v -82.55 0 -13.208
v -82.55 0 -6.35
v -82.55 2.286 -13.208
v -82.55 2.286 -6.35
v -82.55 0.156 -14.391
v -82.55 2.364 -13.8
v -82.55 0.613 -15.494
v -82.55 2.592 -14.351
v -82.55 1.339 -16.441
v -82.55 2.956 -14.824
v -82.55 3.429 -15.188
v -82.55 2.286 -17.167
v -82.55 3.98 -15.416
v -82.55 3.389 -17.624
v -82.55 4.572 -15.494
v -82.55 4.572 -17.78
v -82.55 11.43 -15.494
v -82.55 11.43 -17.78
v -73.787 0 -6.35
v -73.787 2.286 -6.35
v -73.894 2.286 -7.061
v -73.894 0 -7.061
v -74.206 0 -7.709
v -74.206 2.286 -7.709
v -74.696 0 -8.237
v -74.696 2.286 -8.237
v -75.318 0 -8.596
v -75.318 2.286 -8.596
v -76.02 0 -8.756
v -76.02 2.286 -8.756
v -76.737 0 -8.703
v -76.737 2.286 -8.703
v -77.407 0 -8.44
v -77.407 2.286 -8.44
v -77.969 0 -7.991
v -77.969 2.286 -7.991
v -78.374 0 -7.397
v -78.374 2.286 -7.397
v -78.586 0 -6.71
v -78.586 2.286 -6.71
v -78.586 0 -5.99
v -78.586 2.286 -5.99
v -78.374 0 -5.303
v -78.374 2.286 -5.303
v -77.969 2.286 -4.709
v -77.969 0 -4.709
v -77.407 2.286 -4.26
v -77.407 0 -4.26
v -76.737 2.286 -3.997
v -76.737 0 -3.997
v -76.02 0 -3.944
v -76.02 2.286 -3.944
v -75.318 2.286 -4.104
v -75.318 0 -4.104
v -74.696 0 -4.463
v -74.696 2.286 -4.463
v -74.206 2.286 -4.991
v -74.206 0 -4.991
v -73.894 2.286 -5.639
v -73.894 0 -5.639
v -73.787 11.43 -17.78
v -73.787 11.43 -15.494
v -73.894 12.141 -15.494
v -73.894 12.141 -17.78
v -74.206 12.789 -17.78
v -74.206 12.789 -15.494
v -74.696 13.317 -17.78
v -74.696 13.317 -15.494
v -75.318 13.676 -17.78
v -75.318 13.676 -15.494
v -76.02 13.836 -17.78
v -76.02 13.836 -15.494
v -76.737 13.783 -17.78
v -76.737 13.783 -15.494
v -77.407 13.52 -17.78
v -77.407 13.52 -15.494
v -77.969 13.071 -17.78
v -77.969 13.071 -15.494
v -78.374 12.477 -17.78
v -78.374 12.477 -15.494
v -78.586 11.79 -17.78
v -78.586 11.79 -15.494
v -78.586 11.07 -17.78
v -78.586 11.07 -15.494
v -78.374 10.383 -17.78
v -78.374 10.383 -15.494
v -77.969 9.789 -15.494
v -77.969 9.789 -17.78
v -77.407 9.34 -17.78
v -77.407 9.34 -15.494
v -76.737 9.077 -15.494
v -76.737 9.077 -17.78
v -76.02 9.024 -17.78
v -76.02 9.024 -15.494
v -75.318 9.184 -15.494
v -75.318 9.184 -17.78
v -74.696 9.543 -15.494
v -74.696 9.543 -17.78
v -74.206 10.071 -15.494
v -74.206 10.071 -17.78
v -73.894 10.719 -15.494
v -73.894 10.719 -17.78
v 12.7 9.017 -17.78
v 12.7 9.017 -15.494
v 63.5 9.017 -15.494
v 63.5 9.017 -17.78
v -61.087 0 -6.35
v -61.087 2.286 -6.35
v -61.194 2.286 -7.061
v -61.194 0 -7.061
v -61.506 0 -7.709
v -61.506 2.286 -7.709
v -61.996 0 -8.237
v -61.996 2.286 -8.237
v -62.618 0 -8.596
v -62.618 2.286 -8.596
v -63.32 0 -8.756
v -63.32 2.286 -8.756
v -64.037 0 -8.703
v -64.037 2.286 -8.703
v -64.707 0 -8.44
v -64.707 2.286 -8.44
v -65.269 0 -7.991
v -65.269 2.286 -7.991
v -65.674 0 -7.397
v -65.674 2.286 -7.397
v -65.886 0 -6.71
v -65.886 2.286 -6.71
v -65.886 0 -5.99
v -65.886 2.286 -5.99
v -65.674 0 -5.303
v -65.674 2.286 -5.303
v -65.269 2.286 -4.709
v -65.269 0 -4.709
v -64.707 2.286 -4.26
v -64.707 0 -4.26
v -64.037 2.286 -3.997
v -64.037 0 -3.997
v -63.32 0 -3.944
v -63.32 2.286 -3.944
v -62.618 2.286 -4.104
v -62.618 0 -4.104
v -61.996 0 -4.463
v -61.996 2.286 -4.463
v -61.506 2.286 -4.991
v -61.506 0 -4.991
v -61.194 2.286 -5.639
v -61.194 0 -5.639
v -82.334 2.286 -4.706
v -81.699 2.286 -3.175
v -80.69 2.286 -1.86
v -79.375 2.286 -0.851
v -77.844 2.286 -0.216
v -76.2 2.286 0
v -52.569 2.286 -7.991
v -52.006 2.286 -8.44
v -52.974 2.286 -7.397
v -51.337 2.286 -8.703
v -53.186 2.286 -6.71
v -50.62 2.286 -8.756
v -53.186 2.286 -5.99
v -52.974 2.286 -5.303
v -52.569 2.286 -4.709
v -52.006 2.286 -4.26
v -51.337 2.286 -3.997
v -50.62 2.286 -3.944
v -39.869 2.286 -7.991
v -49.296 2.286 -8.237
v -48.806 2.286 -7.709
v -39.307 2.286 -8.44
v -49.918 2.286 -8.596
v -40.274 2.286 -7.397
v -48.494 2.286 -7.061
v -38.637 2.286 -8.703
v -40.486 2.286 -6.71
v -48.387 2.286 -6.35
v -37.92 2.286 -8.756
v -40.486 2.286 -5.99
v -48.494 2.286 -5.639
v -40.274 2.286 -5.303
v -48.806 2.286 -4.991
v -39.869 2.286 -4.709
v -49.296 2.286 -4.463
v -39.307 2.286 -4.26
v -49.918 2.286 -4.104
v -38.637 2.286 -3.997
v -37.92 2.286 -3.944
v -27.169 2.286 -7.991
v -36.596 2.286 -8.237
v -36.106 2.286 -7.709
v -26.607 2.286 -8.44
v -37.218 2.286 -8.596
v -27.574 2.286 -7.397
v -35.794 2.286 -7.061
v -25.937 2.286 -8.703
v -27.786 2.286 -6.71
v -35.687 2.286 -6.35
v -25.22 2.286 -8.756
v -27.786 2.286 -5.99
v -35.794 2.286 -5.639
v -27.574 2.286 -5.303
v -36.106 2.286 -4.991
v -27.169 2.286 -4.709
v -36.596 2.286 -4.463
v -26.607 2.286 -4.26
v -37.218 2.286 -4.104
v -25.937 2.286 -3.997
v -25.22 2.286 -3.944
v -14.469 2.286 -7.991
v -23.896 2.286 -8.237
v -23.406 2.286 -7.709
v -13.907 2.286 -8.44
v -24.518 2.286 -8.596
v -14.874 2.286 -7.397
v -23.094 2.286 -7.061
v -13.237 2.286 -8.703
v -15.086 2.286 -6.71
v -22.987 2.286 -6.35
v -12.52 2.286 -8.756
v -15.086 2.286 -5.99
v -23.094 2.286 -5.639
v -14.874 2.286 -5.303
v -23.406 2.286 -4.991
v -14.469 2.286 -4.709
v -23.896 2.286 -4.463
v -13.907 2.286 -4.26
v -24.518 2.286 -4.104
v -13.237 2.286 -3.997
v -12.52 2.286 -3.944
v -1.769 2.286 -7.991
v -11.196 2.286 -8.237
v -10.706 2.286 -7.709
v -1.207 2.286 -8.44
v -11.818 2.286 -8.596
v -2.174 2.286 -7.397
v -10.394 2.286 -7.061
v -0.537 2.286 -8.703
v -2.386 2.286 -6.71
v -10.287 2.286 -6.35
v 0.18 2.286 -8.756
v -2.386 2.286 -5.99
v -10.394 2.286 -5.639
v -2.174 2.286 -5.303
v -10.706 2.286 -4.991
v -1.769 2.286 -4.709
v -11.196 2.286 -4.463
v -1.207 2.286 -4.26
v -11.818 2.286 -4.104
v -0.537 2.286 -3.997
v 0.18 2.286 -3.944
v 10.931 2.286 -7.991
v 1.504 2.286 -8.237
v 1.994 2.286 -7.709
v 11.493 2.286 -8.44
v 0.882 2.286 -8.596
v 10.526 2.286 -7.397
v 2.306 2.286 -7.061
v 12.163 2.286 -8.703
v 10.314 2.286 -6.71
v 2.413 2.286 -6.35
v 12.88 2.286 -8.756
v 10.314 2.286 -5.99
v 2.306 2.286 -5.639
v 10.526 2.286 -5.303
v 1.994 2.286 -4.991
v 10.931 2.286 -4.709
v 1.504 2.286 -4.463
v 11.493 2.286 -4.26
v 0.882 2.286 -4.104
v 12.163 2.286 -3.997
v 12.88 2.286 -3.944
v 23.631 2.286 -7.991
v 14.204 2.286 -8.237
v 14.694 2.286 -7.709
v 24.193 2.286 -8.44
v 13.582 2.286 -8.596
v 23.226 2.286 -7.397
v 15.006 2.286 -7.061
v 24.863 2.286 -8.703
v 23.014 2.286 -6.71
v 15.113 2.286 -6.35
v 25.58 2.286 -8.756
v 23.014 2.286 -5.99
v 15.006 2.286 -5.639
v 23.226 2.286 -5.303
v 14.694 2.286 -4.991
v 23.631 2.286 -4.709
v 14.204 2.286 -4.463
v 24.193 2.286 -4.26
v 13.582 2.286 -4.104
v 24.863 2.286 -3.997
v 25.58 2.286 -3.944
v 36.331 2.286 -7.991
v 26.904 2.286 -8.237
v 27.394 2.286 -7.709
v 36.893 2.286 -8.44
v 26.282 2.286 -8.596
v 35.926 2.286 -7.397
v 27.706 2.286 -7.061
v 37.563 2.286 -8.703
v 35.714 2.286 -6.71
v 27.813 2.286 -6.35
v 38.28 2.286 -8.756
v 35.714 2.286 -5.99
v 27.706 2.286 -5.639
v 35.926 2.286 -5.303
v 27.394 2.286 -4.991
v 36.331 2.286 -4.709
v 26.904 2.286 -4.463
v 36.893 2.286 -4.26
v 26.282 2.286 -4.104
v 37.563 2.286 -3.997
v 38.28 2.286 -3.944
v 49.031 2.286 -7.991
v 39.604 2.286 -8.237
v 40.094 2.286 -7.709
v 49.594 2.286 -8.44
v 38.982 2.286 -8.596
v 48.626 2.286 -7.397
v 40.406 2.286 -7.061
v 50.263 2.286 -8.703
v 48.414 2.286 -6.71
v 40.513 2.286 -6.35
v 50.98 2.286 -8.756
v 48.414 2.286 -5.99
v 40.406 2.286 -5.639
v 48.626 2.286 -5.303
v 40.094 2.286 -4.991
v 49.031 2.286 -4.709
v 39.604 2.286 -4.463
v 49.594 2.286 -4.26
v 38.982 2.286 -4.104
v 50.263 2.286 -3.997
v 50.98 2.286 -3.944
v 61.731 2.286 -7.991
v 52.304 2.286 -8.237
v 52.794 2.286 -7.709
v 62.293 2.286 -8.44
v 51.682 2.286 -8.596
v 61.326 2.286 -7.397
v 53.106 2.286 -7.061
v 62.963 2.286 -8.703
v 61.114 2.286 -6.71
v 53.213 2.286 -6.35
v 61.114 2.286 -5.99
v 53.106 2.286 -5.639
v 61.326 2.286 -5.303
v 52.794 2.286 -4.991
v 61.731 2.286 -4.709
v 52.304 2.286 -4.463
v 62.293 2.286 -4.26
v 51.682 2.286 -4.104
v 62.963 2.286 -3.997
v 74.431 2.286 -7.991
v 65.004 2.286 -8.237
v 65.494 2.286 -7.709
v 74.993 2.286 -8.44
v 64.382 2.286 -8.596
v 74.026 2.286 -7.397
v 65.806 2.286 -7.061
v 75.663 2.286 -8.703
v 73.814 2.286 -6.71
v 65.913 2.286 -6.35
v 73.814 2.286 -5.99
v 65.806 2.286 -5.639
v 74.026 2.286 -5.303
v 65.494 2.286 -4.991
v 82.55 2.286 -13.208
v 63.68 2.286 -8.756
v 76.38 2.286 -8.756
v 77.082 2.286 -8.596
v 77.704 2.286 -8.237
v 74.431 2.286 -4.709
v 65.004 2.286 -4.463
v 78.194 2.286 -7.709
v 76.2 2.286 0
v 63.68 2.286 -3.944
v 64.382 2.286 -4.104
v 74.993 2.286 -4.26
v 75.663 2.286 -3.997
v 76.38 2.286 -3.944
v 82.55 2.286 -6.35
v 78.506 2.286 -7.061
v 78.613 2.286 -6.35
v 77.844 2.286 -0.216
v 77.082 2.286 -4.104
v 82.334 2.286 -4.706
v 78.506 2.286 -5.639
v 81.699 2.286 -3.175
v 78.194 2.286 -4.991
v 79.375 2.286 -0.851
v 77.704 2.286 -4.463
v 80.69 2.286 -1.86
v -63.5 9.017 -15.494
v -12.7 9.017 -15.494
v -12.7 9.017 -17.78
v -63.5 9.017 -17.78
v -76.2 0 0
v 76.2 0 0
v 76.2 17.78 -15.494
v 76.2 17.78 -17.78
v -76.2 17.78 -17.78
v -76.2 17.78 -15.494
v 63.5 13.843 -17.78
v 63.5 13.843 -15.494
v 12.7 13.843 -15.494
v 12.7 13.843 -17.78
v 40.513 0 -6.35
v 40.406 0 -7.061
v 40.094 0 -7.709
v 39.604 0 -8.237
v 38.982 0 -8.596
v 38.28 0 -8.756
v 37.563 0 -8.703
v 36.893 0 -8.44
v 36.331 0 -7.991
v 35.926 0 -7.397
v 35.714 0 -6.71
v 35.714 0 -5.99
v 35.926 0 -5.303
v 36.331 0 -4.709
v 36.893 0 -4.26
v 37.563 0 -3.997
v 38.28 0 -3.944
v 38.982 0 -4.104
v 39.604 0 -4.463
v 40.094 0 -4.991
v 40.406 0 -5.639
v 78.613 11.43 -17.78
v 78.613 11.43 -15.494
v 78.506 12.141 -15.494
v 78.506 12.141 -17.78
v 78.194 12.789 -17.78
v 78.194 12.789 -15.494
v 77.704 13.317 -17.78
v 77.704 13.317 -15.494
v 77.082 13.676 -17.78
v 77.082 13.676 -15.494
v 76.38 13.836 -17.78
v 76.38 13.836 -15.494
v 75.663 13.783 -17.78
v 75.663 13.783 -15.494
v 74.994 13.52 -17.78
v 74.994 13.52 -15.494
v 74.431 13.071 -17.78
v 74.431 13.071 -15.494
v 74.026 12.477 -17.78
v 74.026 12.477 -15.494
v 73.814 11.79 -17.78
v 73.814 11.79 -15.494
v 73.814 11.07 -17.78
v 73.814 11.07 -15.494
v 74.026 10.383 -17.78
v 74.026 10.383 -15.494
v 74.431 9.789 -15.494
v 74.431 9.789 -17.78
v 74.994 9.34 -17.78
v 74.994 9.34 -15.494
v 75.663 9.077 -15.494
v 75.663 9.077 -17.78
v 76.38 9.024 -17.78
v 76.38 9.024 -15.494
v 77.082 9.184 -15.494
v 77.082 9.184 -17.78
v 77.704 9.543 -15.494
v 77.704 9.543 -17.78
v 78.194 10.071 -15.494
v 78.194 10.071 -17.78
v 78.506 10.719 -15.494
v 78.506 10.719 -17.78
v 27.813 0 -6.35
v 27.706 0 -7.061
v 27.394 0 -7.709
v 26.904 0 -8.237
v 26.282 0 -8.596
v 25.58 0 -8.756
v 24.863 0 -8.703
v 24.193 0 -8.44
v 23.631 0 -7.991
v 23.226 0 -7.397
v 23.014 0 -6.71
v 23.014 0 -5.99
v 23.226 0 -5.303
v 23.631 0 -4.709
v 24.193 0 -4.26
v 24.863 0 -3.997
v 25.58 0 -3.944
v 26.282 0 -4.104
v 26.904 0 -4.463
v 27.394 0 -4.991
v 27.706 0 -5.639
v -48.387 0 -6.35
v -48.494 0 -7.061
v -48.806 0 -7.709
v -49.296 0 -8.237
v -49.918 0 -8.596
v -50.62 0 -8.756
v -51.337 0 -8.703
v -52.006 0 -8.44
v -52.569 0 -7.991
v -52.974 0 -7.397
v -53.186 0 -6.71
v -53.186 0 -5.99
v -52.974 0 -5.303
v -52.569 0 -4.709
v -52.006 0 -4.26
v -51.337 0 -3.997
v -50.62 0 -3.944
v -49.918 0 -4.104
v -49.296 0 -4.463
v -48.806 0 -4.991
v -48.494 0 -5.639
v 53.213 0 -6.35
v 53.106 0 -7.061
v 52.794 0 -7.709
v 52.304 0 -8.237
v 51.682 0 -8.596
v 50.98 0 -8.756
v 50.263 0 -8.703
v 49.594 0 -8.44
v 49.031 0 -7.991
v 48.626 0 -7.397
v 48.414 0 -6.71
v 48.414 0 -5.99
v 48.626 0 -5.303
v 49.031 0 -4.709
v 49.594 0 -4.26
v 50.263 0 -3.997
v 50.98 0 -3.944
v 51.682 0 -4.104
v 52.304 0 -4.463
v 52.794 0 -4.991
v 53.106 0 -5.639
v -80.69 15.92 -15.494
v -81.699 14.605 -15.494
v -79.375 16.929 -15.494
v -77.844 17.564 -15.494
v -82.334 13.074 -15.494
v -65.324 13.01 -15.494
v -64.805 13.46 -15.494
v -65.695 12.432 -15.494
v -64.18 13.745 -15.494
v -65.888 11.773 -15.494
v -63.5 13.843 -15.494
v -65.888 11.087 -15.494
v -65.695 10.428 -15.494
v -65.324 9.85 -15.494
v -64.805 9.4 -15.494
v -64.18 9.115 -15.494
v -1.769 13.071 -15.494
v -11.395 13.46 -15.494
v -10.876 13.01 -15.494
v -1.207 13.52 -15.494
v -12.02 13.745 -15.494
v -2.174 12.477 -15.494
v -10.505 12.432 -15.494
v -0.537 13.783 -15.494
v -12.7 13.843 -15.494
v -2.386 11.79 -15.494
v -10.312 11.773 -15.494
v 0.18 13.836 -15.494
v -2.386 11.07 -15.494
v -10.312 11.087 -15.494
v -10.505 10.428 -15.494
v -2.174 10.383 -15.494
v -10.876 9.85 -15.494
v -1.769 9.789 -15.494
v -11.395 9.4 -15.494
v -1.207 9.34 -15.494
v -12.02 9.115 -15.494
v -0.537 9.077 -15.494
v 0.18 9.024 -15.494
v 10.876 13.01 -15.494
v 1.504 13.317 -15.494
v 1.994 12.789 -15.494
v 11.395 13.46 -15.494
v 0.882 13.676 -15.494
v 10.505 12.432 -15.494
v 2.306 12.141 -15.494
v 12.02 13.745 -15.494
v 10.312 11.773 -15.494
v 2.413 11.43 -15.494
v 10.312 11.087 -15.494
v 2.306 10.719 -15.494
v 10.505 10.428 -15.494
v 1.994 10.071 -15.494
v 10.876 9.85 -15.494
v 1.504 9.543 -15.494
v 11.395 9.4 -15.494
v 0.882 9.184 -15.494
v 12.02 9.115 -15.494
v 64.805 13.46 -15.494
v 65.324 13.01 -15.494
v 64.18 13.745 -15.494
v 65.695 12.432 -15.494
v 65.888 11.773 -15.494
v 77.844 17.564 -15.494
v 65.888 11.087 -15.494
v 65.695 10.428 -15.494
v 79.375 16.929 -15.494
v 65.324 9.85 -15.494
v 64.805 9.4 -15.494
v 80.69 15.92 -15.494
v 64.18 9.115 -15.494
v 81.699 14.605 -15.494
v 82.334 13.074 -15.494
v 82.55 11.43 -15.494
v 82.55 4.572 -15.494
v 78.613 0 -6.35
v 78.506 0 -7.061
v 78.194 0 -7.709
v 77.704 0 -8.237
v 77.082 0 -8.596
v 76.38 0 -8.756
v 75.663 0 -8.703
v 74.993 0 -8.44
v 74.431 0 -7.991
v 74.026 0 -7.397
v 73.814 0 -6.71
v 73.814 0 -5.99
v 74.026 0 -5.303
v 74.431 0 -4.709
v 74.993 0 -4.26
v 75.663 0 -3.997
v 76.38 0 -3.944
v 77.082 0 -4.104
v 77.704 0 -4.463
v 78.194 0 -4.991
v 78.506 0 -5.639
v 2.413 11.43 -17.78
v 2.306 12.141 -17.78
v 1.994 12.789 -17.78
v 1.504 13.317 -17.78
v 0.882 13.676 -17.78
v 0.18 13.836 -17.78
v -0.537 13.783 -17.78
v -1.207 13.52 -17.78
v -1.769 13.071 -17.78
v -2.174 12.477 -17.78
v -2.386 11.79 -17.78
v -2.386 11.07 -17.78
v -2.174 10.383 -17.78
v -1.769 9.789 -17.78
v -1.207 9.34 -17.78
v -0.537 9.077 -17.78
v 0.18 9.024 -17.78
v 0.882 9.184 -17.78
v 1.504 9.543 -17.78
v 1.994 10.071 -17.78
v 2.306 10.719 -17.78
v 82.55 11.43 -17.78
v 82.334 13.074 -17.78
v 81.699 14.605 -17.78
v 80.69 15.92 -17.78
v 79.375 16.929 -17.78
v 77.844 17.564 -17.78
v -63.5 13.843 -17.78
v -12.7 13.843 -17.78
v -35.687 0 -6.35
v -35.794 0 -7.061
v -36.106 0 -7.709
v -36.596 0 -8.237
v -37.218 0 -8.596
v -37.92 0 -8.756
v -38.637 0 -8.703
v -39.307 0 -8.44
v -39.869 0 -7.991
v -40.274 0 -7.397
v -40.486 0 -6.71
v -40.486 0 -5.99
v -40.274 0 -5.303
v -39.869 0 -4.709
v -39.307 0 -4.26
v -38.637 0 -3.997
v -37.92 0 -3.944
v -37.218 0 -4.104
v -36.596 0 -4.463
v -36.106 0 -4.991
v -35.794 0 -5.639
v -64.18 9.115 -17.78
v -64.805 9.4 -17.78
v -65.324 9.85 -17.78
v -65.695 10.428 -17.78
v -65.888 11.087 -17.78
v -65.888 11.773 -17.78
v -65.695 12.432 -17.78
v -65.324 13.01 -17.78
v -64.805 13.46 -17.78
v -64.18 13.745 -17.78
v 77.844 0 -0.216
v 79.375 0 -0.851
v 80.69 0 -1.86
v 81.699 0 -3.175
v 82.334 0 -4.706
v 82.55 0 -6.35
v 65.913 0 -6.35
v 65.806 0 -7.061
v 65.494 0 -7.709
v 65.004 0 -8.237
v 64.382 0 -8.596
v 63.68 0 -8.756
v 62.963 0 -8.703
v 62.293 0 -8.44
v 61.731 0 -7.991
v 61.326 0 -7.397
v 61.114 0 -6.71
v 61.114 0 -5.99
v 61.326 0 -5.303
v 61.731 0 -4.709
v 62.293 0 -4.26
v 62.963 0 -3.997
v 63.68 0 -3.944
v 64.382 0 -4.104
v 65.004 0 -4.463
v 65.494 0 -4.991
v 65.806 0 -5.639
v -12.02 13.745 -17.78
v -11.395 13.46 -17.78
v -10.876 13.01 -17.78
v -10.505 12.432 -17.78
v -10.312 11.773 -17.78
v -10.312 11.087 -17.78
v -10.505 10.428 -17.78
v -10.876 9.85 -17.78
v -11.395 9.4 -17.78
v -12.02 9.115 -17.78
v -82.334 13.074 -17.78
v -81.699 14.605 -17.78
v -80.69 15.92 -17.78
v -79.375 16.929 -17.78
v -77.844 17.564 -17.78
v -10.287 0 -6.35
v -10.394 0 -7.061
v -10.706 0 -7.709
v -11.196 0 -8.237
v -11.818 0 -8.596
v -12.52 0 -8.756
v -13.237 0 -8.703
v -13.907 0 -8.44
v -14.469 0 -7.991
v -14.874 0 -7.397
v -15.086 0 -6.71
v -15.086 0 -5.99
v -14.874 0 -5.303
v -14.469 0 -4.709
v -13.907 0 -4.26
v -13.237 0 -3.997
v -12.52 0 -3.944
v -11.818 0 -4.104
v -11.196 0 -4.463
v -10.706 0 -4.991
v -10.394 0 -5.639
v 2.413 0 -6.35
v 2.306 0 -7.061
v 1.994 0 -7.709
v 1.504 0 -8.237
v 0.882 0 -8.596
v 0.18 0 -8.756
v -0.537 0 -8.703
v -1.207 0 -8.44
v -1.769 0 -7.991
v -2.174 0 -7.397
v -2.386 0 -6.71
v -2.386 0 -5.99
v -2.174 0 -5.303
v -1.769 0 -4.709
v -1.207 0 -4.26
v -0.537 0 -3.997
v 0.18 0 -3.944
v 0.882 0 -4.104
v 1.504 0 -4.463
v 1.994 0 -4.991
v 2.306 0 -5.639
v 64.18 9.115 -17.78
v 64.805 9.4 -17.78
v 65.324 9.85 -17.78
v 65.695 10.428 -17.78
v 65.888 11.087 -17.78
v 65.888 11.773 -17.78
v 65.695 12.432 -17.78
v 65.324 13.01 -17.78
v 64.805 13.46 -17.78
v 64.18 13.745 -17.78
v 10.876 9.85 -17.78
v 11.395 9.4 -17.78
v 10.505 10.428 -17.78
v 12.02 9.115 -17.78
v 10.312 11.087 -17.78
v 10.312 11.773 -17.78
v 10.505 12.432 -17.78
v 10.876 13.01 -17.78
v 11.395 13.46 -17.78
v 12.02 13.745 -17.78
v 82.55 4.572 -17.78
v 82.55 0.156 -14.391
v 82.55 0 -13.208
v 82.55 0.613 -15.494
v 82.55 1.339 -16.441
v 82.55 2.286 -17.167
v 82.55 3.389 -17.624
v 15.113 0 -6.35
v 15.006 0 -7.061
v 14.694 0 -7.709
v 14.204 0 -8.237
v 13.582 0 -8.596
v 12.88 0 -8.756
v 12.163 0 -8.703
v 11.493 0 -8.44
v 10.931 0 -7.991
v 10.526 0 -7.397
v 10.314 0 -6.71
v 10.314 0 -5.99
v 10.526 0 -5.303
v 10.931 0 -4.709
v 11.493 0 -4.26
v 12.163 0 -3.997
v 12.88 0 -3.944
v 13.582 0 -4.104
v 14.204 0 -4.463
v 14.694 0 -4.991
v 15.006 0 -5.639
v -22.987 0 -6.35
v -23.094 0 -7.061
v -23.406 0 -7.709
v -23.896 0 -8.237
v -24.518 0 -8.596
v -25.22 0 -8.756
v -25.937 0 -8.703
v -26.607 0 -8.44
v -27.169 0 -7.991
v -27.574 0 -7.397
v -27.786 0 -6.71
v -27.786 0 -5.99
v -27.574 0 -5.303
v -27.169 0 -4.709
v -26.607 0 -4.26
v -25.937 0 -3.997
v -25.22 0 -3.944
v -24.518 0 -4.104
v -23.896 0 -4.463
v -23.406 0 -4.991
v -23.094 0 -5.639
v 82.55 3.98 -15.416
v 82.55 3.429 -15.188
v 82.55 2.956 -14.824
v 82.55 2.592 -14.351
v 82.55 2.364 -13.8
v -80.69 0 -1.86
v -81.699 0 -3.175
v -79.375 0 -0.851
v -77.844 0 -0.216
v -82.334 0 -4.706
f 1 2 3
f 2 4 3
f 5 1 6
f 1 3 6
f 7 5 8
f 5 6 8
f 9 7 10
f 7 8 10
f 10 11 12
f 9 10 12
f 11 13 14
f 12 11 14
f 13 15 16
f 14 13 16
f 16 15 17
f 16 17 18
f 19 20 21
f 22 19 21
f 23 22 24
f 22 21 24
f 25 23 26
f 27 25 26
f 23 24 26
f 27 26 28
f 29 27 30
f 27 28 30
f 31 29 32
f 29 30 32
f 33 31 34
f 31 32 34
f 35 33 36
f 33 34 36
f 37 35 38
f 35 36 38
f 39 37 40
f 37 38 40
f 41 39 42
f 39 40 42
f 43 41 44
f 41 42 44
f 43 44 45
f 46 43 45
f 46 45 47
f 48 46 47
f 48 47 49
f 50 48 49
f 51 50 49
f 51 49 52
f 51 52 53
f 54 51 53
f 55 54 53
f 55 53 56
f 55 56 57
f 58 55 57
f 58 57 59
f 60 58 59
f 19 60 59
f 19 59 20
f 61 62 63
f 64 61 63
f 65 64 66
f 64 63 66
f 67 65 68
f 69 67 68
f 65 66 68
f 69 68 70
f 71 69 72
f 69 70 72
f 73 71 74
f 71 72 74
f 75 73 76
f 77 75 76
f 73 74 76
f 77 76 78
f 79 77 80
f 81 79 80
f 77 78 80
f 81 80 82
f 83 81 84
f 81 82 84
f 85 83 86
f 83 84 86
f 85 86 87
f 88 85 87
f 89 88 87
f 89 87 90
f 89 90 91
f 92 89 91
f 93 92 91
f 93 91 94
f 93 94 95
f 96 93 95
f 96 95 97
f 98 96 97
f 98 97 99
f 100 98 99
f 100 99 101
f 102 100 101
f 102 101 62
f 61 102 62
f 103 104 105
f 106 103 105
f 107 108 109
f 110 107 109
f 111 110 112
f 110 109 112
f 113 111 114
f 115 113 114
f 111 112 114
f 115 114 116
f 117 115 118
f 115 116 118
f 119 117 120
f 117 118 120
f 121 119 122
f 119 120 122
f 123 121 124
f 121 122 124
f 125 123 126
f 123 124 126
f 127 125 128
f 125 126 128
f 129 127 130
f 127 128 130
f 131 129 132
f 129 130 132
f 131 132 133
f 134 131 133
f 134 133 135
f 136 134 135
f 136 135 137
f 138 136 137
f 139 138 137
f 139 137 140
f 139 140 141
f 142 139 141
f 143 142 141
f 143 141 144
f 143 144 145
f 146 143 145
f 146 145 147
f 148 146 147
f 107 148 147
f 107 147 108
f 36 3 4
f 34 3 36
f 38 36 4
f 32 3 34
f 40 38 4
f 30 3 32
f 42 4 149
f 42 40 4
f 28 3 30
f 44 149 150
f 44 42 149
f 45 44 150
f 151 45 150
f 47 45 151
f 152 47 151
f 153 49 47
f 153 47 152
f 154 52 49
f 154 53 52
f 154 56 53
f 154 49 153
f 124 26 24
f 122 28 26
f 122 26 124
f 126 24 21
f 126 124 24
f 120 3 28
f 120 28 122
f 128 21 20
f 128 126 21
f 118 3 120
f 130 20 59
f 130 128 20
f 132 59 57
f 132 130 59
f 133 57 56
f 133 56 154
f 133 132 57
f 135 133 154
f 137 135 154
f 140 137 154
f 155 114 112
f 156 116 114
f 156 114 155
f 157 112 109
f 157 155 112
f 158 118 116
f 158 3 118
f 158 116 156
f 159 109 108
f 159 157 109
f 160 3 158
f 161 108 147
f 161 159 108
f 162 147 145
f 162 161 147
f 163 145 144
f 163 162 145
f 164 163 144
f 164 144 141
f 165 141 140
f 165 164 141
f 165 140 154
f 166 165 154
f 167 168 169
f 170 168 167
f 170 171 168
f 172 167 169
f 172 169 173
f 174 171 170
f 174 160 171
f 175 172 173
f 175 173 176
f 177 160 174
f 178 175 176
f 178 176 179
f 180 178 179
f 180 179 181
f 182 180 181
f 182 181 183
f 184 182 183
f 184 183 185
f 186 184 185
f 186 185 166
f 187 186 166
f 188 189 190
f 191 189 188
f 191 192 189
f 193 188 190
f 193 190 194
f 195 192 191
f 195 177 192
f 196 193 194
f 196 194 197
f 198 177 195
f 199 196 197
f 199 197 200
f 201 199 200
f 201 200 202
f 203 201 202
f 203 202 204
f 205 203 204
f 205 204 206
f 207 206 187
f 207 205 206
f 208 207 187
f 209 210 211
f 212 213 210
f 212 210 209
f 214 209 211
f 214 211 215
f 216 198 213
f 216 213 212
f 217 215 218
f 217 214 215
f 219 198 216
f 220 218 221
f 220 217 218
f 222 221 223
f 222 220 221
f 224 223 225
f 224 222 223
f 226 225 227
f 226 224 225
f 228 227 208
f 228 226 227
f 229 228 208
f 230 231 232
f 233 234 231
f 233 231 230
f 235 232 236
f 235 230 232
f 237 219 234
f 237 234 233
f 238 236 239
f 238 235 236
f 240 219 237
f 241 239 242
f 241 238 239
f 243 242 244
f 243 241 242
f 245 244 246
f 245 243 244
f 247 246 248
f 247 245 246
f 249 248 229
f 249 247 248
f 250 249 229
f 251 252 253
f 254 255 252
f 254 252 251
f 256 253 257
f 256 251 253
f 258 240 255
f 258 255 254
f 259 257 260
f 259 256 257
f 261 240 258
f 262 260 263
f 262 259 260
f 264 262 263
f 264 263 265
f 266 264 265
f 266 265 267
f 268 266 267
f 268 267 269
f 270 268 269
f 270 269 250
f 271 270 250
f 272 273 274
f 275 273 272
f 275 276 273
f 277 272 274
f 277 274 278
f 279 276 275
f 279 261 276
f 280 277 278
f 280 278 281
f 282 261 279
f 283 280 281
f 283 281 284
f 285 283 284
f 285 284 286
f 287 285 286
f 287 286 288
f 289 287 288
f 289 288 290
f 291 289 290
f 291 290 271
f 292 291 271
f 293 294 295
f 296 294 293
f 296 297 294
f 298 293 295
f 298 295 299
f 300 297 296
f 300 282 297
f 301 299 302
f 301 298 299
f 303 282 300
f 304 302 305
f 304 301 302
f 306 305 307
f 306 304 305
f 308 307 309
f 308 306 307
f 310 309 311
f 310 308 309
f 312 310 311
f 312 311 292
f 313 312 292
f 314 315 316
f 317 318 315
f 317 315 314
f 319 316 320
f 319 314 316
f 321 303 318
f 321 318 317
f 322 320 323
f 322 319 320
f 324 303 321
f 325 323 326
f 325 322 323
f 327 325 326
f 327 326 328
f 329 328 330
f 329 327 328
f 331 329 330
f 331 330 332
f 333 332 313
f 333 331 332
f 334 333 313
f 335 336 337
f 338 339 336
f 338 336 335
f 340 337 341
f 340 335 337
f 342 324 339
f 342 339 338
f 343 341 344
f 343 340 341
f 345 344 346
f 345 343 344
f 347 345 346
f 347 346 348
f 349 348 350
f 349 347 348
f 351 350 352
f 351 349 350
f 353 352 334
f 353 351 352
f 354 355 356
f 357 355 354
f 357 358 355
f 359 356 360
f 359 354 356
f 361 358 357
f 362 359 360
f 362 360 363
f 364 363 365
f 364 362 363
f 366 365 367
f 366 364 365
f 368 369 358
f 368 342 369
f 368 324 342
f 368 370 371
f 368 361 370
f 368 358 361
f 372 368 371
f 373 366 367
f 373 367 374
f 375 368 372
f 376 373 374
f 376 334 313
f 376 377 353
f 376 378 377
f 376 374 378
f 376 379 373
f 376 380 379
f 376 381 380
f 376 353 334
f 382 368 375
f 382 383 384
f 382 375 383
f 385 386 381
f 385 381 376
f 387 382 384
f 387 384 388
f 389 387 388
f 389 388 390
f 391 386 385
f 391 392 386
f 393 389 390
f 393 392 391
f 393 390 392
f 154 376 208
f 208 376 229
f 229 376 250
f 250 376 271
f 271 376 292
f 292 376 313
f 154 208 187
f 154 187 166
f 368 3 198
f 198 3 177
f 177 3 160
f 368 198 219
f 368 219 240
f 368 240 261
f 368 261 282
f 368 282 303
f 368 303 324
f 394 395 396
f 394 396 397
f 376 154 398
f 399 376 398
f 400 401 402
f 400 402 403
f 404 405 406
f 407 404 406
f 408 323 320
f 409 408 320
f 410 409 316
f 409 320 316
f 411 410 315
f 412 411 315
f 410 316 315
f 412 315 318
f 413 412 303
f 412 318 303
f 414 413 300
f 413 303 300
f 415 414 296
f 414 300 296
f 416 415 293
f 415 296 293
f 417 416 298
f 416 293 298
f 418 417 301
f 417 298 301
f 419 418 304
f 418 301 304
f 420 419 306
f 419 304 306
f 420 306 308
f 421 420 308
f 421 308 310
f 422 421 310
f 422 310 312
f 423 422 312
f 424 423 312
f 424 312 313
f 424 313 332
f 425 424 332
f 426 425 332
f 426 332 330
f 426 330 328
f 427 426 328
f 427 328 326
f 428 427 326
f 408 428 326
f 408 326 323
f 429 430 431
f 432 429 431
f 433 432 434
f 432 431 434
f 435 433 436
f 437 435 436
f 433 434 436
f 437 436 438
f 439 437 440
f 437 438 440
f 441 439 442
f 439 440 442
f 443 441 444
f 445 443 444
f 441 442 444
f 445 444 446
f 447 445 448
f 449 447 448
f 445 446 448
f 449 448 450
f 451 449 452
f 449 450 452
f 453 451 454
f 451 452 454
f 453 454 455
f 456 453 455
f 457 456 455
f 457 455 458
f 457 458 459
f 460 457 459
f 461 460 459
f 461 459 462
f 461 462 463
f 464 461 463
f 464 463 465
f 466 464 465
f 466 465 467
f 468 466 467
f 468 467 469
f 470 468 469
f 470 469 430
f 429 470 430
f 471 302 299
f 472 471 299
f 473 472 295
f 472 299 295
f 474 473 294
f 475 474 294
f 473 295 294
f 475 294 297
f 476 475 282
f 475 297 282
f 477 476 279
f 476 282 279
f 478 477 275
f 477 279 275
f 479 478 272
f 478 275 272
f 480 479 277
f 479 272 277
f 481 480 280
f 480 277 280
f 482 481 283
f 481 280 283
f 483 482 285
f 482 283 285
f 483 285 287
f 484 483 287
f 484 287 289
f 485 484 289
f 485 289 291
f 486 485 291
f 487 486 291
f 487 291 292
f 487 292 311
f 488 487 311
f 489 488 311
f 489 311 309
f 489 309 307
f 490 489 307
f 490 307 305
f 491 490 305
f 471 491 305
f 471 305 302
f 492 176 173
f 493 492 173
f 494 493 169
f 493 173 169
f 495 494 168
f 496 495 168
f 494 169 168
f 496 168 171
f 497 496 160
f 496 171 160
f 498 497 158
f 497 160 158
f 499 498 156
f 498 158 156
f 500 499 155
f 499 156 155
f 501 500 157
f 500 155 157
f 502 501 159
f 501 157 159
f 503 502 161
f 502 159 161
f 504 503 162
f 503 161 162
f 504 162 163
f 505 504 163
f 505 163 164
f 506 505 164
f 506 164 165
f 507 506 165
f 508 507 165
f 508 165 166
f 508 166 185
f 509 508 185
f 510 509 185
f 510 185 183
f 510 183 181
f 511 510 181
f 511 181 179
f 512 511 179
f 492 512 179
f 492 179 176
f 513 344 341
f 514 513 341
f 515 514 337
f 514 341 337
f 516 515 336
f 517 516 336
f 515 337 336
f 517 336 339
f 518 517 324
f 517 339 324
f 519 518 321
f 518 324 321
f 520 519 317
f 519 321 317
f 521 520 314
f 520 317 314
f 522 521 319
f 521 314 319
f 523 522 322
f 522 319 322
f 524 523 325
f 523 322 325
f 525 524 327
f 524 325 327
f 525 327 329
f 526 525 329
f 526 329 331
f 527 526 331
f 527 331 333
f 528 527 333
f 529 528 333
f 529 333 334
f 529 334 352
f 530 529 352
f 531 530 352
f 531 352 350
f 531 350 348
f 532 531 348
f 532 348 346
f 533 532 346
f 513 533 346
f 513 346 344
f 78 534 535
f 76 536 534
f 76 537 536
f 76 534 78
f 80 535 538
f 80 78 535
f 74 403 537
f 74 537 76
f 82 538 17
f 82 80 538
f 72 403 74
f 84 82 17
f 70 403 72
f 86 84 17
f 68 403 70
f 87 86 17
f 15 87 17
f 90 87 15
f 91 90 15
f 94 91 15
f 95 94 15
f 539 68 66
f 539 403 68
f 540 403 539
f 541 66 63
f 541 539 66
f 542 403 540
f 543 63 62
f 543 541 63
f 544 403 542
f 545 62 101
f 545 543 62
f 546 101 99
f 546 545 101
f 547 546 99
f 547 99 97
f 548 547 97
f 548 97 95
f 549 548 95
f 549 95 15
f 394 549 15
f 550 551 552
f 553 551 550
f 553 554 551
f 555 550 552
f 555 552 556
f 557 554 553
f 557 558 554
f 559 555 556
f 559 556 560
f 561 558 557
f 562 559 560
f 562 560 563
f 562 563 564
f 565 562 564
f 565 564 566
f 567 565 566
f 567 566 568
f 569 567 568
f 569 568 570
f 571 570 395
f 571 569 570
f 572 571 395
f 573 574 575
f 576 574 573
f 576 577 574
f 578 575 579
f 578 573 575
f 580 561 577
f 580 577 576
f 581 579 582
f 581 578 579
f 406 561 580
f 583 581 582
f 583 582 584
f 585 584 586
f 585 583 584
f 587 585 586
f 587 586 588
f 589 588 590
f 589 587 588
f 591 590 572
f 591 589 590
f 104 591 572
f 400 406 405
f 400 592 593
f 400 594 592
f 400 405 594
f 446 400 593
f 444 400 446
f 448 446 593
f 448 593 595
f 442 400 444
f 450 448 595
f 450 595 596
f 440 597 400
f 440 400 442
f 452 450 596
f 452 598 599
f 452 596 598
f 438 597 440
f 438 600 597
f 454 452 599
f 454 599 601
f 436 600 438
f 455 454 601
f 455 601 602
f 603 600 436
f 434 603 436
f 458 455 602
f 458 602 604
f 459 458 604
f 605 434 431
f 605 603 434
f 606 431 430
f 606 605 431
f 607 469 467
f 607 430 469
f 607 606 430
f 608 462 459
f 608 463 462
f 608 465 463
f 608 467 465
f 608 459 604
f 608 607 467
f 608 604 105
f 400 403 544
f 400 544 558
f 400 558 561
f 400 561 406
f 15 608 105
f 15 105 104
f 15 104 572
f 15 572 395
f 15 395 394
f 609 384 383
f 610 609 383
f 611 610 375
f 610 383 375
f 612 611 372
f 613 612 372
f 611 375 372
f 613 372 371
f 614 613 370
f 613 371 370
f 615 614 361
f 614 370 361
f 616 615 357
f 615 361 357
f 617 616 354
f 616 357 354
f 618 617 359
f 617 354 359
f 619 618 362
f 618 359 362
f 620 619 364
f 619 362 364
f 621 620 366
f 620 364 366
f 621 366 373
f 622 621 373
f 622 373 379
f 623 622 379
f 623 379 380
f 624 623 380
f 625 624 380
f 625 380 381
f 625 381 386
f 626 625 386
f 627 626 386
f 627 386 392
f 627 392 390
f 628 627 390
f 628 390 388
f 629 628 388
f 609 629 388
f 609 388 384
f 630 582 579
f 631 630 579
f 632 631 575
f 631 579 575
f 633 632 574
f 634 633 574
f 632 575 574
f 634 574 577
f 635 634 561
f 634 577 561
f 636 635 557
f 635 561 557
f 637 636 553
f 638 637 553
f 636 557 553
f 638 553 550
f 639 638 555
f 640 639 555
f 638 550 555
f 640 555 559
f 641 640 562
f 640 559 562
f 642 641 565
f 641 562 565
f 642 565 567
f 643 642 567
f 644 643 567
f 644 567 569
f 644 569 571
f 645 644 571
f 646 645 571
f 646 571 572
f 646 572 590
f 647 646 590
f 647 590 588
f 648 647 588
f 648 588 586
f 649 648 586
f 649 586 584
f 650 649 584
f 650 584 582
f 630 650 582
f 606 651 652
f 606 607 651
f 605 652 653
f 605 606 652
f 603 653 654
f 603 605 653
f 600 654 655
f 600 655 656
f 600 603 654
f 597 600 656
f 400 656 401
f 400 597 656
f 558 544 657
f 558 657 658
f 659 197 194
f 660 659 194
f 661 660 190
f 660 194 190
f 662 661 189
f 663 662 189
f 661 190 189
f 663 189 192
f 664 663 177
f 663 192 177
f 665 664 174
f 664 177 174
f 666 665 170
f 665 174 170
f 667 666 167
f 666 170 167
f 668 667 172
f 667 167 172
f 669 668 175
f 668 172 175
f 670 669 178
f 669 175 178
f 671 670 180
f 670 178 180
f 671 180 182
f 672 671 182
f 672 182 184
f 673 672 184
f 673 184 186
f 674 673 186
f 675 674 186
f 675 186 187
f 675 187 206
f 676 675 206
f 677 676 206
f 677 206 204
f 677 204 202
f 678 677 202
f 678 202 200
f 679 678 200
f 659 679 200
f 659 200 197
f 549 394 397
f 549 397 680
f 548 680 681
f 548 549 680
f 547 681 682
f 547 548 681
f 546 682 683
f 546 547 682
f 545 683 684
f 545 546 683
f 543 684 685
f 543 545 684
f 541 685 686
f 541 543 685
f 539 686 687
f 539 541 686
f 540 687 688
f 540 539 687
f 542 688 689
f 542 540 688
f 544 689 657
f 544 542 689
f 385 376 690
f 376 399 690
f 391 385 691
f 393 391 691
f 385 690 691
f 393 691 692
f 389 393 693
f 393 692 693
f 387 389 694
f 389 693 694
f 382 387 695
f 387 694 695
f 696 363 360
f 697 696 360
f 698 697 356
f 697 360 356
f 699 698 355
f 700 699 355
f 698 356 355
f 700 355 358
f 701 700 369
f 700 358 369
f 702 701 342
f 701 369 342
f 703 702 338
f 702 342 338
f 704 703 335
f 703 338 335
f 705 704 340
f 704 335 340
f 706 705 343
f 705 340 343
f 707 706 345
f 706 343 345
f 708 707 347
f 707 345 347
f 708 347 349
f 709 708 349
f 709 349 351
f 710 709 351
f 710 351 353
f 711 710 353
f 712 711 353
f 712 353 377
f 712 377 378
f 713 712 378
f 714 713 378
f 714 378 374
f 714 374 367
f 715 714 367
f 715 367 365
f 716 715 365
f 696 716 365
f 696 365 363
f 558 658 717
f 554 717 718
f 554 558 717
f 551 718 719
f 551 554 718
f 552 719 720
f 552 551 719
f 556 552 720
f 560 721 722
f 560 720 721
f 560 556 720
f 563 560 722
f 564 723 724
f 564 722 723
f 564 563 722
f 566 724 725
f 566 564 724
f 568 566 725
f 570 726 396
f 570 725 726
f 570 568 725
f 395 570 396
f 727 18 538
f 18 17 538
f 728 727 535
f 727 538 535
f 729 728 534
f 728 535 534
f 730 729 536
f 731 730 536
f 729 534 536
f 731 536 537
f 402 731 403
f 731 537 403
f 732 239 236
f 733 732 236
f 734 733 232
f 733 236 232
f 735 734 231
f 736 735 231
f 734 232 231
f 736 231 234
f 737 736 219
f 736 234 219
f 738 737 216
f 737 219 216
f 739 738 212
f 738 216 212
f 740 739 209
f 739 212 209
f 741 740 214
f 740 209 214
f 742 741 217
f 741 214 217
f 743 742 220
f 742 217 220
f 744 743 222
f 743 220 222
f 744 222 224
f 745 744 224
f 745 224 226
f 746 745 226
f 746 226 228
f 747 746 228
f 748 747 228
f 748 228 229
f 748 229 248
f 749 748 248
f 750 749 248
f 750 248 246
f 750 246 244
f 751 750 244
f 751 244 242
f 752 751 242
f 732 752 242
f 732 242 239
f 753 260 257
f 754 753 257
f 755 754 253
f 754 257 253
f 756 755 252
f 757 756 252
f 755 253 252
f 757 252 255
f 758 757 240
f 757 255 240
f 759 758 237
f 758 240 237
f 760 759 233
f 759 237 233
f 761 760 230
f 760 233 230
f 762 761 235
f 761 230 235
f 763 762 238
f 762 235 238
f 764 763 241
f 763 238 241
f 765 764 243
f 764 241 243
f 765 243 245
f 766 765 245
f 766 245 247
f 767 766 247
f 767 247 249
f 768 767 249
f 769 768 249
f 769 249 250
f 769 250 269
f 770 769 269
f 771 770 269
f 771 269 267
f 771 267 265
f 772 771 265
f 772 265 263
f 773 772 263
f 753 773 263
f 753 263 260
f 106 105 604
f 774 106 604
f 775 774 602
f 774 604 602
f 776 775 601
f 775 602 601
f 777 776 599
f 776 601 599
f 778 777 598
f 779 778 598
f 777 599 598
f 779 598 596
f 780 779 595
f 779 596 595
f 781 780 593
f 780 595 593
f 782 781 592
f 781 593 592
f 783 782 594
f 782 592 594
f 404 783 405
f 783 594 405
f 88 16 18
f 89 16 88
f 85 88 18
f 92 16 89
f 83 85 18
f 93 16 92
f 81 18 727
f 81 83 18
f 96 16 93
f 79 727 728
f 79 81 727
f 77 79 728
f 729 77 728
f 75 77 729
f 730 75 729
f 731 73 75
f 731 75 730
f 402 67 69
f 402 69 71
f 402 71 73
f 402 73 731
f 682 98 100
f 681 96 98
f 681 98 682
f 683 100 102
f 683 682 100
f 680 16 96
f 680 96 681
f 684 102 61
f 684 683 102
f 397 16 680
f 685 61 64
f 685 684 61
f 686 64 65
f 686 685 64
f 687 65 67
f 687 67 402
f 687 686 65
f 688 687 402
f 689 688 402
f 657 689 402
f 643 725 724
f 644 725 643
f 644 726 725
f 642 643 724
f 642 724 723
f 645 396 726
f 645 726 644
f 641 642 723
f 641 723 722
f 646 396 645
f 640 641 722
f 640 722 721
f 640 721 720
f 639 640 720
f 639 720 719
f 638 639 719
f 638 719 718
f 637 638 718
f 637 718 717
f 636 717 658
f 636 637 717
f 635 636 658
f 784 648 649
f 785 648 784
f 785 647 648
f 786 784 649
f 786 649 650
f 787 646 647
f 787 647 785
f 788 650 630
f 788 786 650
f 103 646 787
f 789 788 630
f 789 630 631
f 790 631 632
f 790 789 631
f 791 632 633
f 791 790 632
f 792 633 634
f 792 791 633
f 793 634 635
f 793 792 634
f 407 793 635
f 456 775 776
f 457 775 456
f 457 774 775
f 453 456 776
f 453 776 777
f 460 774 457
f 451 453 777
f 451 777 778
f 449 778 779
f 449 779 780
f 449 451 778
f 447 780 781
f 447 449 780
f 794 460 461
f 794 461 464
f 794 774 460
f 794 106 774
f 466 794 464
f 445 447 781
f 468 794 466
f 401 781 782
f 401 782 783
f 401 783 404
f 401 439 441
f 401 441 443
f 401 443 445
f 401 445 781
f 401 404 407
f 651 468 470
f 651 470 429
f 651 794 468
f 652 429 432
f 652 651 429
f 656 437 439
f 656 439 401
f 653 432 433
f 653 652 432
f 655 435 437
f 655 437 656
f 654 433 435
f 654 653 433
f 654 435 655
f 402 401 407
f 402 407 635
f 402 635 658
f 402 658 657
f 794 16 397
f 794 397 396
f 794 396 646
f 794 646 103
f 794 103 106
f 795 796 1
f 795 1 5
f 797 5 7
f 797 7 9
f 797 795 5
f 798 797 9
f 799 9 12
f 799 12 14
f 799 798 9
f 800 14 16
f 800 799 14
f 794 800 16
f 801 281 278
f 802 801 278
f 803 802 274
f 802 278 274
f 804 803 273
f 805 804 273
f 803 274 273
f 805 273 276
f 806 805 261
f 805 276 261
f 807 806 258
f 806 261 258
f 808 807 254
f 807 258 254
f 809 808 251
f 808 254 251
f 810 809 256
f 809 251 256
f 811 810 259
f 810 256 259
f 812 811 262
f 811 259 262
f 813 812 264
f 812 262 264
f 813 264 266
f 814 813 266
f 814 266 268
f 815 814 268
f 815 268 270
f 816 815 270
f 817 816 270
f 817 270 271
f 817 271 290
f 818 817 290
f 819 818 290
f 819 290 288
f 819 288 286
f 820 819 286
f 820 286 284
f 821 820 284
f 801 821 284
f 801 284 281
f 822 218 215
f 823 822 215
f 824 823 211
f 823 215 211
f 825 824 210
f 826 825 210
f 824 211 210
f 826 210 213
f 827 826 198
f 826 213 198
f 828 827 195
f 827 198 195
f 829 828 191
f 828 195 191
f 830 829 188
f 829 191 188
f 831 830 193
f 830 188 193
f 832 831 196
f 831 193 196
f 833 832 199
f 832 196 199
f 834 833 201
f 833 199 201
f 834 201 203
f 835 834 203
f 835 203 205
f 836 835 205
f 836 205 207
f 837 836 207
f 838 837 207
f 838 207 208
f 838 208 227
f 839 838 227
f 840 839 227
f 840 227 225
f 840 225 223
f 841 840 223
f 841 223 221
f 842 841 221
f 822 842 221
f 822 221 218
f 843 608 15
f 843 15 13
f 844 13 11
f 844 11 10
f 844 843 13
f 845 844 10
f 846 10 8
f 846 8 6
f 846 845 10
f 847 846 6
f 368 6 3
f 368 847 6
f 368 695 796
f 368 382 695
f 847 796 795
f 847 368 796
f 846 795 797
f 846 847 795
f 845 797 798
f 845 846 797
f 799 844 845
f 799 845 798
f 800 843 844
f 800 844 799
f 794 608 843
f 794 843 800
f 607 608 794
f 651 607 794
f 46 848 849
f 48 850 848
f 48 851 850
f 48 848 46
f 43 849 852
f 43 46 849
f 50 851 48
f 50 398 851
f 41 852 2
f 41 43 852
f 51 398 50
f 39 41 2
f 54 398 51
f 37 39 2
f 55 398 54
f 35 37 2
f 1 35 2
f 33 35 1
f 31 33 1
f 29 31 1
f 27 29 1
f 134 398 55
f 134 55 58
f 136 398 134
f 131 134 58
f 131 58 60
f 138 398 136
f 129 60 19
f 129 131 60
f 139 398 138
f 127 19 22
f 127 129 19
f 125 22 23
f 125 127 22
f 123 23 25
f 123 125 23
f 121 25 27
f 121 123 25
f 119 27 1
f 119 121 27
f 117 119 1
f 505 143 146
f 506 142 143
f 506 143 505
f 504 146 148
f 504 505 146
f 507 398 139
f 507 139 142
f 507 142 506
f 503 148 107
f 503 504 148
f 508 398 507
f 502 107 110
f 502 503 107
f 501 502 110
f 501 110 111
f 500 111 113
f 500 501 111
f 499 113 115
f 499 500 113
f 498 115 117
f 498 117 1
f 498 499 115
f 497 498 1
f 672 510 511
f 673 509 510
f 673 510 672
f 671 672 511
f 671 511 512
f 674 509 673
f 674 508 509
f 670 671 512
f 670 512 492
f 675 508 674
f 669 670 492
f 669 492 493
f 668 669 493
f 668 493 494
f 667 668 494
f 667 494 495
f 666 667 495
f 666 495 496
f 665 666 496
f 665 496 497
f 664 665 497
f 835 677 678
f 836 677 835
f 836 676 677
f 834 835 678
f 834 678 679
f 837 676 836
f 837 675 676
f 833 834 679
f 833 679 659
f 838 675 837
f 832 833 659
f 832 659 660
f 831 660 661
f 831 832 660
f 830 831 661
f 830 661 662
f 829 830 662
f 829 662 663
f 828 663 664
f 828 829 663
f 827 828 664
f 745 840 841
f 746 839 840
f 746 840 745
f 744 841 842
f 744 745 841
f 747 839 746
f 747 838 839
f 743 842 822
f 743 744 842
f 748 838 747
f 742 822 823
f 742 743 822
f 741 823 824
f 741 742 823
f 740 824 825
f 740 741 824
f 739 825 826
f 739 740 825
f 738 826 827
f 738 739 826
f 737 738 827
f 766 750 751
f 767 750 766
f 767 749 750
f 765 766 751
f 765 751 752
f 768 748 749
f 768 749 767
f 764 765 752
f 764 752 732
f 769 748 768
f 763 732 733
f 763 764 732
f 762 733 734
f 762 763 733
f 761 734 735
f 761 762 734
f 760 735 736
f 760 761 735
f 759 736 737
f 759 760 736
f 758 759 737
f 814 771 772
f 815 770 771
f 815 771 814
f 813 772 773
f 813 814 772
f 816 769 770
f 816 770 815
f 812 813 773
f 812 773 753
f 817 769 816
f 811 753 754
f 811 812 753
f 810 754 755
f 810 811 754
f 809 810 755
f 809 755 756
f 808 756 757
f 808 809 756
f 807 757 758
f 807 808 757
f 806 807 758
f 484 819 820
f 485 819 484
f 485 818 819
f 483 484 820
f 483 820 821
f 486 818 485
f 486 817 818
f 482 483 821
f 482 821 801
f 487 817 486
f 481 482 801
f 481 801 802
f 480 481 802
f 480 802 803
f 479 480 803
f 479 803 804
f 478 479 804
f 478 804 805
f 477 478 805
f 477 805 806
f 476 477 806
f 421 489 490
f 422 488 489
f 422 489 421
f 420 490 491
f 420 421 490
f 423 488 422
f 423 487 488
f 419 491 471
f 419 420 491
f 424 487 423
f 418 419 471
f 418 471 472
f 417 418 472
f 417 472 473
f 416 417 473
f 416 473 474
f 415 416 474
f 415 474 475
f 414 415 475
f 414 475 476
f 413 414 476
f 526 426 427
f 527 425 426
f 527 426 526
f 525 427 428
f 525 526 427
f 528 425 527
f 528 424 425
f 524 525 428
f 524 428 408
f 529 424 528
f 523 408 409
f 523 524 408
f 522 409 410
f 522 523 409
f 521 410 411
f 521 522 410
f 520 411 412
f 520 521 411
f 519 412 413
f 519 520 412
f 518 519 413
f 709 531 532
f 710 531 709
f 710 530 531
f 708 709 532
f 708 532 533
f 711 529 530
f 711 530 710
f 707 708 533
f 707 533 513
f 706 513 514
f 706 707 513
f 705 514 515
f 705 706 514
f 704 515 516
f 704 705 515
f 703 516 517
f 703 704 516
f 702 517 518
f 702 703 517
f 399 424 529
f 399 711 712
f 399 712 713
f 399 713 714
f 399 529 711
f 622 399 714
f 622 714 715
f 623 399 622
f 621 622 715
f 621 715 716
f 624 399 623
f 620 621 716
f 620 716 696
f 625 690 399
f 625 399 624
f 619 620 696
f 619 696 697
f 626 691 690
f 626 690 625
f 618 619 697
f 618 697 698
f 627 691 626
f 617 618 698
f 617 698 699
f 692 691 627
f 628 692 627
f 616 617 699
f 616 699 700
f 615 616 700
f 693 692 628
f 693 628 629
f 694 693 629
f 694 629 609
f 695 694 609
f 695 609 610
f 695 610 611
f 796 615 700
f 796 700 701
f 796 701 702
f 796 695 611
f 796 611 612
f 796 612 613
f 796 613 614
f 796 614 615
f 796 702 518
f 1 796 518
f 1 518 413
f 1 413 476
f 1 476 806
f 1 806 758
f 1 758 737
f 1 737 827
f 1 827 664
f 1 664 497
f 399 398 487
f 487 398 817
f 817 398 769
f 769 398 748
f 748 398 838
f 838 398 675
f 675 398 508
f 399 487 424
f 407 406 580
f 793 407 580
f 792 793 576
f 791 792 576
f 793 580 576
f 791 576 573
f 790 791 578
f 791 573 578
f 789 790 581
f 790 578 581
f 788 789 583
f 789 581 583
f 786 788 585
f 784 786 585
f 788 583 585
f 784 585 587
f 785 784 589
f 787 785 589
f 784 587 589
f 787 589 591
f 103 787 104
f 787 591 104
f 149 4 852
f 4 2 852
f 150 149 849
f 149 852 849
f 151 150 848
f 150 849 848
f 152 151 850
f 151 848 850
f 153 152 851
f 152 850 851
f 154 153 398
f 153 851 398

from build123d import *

# Parameters (mm, degrees)
EXTRUDE_THIN1_DEPTH = 82.55
SKETCH2_R           = 2.413
CUT_EXTRUDE1_DEPTH  = 3.286
LPATTERN1_COUNT     = 13
LPATTERN1_PITCH     = 12.7
FILLET1_R           = 6.35
SKETCH3_R           = 2.413
CUT_EXTRUDE2_DEPTH  = 3.286
LPATTERN2_COUNT     = 3
LPATTERN2_PITCH     = 76.2
CUT_EXTRUDE3_DEPTH  = 3.286


with BuildPart() as part:
    # Sketch1 → Extrude-Thin1 (new body, symmetric)
    with BuildSketch(Plane(origin=(0, 0, 0), x_dir=(0, 0, -1), z_dir=(1, 0, 0))):
        with BuildLine():
            Line((0, 0), (13.208, 0))
            ThreePointArc((13.208, 0), (16.440892204, 1.339107796), (17.78, 4.572))
            Line((17.78, 4.572), (17.78, 17.78))
            Line((17.78, 17.78), (15.494, 17.78))
            Line((15.494, 17.78), (15.494, 4.572))
            ThreePointArc((15.494, 4.572), (14.824446102, 2.955553898), (13.208, 2.286))
            Line((13.208, 2.286), (0, 2.286))
            Line((0, 2.286), (0, 0))
        make_face()
    extrude(amount=EXTRUDE_THIN1_DEPTH, both=True)

    # Sketch2 → Cut-Extrude1 (cut, through all)
    with BuildSketch(Plane(origin=(0, 2.286, 0), x_dir=(1, 0, 0), z_dir=(0, 1, 0))):
        with Locations((-76.2, 6.35)):
            Circle(SKETCH2_R)
    cut_extrude1 = extrude(amount=-CUT_EXTRUDE1_DEPTH, mode=Mode.SUBTRACT)

    # LPattern1: Cut-Extrude1 ×13
    with Locations(*[(i * LPATTERN1_PITCH, 0, 0) for i in range(1, LPATTERN1_COUNT)]):
        add(cut_extrude1, mode=Mode.SUBTRACT)

    # Fillet1
    fillet1_edges = [part.edges().sort_by_distance(p)[0] for p in [
        (82.55, 1.143, 0),
        (82.55, 17.78, -16.637),
        (-82.55, 1.143, 0),
        (-82.55, 17.78, -16.637),
    ]]
    fillet(fillet1_edges, radius=FILLET1_R)

    # Sketch3 → Cut-Extrude2 (cut, through all)
    with BuildSketch(Plane.XY.offset(-15.494)):
        with Locations((-76.2, 11.43)):
            Circle(SKETCH3_R)
    cut_extrude2 = extrude(amount=-CUT_EXTRUDE2_DEPTH, mode=Mode.SUBTRACT)

    # LPattern2: Cut-Extrude2 ×3
    with Locations(*[(i * LPATTERN2_PITCH, 0, 0) for i in range(1, LPATTERN2_COUNT)]):
        add(cut_extrude2, mode=Mode.SUBTRACT)

    # Sketch4 → Cut-Extrude3 (cut, through all)
    with BuildSketch(Plane.XY.offset(-15.494)):
        with BuildLine():
            Line((-63.5, 13.843), (-12.7, 13.843))
            ThreePointArc((-12.7, 13.843), (-10.287, 11.43), (-12.7, 9.017))
            Line((-12.7, 9.017), (-63.5, 9.017))
            ThreePointArc((-63.5, 9.017), (-65.913, 11.43), (-63.5, 13.843))
        make_face()
        with BuildLine():
            Line((63.5, 13.843), (12.7, 13.843))
            ThreePointArc((12.7, 13.843), (10.287, 11.43), (12.7, 9.017))
            Line((12.7, 9.017), (63.5, 9.017))
            ThreePointArc((63.5, 9.017), (65.913, 11.43), (63.5, 13.843))
        make_face()
    extrude(amount=-CUT_EXTRUDE3_DEPTH, mode=Mode.SUBTRACT)


solid = part.part
